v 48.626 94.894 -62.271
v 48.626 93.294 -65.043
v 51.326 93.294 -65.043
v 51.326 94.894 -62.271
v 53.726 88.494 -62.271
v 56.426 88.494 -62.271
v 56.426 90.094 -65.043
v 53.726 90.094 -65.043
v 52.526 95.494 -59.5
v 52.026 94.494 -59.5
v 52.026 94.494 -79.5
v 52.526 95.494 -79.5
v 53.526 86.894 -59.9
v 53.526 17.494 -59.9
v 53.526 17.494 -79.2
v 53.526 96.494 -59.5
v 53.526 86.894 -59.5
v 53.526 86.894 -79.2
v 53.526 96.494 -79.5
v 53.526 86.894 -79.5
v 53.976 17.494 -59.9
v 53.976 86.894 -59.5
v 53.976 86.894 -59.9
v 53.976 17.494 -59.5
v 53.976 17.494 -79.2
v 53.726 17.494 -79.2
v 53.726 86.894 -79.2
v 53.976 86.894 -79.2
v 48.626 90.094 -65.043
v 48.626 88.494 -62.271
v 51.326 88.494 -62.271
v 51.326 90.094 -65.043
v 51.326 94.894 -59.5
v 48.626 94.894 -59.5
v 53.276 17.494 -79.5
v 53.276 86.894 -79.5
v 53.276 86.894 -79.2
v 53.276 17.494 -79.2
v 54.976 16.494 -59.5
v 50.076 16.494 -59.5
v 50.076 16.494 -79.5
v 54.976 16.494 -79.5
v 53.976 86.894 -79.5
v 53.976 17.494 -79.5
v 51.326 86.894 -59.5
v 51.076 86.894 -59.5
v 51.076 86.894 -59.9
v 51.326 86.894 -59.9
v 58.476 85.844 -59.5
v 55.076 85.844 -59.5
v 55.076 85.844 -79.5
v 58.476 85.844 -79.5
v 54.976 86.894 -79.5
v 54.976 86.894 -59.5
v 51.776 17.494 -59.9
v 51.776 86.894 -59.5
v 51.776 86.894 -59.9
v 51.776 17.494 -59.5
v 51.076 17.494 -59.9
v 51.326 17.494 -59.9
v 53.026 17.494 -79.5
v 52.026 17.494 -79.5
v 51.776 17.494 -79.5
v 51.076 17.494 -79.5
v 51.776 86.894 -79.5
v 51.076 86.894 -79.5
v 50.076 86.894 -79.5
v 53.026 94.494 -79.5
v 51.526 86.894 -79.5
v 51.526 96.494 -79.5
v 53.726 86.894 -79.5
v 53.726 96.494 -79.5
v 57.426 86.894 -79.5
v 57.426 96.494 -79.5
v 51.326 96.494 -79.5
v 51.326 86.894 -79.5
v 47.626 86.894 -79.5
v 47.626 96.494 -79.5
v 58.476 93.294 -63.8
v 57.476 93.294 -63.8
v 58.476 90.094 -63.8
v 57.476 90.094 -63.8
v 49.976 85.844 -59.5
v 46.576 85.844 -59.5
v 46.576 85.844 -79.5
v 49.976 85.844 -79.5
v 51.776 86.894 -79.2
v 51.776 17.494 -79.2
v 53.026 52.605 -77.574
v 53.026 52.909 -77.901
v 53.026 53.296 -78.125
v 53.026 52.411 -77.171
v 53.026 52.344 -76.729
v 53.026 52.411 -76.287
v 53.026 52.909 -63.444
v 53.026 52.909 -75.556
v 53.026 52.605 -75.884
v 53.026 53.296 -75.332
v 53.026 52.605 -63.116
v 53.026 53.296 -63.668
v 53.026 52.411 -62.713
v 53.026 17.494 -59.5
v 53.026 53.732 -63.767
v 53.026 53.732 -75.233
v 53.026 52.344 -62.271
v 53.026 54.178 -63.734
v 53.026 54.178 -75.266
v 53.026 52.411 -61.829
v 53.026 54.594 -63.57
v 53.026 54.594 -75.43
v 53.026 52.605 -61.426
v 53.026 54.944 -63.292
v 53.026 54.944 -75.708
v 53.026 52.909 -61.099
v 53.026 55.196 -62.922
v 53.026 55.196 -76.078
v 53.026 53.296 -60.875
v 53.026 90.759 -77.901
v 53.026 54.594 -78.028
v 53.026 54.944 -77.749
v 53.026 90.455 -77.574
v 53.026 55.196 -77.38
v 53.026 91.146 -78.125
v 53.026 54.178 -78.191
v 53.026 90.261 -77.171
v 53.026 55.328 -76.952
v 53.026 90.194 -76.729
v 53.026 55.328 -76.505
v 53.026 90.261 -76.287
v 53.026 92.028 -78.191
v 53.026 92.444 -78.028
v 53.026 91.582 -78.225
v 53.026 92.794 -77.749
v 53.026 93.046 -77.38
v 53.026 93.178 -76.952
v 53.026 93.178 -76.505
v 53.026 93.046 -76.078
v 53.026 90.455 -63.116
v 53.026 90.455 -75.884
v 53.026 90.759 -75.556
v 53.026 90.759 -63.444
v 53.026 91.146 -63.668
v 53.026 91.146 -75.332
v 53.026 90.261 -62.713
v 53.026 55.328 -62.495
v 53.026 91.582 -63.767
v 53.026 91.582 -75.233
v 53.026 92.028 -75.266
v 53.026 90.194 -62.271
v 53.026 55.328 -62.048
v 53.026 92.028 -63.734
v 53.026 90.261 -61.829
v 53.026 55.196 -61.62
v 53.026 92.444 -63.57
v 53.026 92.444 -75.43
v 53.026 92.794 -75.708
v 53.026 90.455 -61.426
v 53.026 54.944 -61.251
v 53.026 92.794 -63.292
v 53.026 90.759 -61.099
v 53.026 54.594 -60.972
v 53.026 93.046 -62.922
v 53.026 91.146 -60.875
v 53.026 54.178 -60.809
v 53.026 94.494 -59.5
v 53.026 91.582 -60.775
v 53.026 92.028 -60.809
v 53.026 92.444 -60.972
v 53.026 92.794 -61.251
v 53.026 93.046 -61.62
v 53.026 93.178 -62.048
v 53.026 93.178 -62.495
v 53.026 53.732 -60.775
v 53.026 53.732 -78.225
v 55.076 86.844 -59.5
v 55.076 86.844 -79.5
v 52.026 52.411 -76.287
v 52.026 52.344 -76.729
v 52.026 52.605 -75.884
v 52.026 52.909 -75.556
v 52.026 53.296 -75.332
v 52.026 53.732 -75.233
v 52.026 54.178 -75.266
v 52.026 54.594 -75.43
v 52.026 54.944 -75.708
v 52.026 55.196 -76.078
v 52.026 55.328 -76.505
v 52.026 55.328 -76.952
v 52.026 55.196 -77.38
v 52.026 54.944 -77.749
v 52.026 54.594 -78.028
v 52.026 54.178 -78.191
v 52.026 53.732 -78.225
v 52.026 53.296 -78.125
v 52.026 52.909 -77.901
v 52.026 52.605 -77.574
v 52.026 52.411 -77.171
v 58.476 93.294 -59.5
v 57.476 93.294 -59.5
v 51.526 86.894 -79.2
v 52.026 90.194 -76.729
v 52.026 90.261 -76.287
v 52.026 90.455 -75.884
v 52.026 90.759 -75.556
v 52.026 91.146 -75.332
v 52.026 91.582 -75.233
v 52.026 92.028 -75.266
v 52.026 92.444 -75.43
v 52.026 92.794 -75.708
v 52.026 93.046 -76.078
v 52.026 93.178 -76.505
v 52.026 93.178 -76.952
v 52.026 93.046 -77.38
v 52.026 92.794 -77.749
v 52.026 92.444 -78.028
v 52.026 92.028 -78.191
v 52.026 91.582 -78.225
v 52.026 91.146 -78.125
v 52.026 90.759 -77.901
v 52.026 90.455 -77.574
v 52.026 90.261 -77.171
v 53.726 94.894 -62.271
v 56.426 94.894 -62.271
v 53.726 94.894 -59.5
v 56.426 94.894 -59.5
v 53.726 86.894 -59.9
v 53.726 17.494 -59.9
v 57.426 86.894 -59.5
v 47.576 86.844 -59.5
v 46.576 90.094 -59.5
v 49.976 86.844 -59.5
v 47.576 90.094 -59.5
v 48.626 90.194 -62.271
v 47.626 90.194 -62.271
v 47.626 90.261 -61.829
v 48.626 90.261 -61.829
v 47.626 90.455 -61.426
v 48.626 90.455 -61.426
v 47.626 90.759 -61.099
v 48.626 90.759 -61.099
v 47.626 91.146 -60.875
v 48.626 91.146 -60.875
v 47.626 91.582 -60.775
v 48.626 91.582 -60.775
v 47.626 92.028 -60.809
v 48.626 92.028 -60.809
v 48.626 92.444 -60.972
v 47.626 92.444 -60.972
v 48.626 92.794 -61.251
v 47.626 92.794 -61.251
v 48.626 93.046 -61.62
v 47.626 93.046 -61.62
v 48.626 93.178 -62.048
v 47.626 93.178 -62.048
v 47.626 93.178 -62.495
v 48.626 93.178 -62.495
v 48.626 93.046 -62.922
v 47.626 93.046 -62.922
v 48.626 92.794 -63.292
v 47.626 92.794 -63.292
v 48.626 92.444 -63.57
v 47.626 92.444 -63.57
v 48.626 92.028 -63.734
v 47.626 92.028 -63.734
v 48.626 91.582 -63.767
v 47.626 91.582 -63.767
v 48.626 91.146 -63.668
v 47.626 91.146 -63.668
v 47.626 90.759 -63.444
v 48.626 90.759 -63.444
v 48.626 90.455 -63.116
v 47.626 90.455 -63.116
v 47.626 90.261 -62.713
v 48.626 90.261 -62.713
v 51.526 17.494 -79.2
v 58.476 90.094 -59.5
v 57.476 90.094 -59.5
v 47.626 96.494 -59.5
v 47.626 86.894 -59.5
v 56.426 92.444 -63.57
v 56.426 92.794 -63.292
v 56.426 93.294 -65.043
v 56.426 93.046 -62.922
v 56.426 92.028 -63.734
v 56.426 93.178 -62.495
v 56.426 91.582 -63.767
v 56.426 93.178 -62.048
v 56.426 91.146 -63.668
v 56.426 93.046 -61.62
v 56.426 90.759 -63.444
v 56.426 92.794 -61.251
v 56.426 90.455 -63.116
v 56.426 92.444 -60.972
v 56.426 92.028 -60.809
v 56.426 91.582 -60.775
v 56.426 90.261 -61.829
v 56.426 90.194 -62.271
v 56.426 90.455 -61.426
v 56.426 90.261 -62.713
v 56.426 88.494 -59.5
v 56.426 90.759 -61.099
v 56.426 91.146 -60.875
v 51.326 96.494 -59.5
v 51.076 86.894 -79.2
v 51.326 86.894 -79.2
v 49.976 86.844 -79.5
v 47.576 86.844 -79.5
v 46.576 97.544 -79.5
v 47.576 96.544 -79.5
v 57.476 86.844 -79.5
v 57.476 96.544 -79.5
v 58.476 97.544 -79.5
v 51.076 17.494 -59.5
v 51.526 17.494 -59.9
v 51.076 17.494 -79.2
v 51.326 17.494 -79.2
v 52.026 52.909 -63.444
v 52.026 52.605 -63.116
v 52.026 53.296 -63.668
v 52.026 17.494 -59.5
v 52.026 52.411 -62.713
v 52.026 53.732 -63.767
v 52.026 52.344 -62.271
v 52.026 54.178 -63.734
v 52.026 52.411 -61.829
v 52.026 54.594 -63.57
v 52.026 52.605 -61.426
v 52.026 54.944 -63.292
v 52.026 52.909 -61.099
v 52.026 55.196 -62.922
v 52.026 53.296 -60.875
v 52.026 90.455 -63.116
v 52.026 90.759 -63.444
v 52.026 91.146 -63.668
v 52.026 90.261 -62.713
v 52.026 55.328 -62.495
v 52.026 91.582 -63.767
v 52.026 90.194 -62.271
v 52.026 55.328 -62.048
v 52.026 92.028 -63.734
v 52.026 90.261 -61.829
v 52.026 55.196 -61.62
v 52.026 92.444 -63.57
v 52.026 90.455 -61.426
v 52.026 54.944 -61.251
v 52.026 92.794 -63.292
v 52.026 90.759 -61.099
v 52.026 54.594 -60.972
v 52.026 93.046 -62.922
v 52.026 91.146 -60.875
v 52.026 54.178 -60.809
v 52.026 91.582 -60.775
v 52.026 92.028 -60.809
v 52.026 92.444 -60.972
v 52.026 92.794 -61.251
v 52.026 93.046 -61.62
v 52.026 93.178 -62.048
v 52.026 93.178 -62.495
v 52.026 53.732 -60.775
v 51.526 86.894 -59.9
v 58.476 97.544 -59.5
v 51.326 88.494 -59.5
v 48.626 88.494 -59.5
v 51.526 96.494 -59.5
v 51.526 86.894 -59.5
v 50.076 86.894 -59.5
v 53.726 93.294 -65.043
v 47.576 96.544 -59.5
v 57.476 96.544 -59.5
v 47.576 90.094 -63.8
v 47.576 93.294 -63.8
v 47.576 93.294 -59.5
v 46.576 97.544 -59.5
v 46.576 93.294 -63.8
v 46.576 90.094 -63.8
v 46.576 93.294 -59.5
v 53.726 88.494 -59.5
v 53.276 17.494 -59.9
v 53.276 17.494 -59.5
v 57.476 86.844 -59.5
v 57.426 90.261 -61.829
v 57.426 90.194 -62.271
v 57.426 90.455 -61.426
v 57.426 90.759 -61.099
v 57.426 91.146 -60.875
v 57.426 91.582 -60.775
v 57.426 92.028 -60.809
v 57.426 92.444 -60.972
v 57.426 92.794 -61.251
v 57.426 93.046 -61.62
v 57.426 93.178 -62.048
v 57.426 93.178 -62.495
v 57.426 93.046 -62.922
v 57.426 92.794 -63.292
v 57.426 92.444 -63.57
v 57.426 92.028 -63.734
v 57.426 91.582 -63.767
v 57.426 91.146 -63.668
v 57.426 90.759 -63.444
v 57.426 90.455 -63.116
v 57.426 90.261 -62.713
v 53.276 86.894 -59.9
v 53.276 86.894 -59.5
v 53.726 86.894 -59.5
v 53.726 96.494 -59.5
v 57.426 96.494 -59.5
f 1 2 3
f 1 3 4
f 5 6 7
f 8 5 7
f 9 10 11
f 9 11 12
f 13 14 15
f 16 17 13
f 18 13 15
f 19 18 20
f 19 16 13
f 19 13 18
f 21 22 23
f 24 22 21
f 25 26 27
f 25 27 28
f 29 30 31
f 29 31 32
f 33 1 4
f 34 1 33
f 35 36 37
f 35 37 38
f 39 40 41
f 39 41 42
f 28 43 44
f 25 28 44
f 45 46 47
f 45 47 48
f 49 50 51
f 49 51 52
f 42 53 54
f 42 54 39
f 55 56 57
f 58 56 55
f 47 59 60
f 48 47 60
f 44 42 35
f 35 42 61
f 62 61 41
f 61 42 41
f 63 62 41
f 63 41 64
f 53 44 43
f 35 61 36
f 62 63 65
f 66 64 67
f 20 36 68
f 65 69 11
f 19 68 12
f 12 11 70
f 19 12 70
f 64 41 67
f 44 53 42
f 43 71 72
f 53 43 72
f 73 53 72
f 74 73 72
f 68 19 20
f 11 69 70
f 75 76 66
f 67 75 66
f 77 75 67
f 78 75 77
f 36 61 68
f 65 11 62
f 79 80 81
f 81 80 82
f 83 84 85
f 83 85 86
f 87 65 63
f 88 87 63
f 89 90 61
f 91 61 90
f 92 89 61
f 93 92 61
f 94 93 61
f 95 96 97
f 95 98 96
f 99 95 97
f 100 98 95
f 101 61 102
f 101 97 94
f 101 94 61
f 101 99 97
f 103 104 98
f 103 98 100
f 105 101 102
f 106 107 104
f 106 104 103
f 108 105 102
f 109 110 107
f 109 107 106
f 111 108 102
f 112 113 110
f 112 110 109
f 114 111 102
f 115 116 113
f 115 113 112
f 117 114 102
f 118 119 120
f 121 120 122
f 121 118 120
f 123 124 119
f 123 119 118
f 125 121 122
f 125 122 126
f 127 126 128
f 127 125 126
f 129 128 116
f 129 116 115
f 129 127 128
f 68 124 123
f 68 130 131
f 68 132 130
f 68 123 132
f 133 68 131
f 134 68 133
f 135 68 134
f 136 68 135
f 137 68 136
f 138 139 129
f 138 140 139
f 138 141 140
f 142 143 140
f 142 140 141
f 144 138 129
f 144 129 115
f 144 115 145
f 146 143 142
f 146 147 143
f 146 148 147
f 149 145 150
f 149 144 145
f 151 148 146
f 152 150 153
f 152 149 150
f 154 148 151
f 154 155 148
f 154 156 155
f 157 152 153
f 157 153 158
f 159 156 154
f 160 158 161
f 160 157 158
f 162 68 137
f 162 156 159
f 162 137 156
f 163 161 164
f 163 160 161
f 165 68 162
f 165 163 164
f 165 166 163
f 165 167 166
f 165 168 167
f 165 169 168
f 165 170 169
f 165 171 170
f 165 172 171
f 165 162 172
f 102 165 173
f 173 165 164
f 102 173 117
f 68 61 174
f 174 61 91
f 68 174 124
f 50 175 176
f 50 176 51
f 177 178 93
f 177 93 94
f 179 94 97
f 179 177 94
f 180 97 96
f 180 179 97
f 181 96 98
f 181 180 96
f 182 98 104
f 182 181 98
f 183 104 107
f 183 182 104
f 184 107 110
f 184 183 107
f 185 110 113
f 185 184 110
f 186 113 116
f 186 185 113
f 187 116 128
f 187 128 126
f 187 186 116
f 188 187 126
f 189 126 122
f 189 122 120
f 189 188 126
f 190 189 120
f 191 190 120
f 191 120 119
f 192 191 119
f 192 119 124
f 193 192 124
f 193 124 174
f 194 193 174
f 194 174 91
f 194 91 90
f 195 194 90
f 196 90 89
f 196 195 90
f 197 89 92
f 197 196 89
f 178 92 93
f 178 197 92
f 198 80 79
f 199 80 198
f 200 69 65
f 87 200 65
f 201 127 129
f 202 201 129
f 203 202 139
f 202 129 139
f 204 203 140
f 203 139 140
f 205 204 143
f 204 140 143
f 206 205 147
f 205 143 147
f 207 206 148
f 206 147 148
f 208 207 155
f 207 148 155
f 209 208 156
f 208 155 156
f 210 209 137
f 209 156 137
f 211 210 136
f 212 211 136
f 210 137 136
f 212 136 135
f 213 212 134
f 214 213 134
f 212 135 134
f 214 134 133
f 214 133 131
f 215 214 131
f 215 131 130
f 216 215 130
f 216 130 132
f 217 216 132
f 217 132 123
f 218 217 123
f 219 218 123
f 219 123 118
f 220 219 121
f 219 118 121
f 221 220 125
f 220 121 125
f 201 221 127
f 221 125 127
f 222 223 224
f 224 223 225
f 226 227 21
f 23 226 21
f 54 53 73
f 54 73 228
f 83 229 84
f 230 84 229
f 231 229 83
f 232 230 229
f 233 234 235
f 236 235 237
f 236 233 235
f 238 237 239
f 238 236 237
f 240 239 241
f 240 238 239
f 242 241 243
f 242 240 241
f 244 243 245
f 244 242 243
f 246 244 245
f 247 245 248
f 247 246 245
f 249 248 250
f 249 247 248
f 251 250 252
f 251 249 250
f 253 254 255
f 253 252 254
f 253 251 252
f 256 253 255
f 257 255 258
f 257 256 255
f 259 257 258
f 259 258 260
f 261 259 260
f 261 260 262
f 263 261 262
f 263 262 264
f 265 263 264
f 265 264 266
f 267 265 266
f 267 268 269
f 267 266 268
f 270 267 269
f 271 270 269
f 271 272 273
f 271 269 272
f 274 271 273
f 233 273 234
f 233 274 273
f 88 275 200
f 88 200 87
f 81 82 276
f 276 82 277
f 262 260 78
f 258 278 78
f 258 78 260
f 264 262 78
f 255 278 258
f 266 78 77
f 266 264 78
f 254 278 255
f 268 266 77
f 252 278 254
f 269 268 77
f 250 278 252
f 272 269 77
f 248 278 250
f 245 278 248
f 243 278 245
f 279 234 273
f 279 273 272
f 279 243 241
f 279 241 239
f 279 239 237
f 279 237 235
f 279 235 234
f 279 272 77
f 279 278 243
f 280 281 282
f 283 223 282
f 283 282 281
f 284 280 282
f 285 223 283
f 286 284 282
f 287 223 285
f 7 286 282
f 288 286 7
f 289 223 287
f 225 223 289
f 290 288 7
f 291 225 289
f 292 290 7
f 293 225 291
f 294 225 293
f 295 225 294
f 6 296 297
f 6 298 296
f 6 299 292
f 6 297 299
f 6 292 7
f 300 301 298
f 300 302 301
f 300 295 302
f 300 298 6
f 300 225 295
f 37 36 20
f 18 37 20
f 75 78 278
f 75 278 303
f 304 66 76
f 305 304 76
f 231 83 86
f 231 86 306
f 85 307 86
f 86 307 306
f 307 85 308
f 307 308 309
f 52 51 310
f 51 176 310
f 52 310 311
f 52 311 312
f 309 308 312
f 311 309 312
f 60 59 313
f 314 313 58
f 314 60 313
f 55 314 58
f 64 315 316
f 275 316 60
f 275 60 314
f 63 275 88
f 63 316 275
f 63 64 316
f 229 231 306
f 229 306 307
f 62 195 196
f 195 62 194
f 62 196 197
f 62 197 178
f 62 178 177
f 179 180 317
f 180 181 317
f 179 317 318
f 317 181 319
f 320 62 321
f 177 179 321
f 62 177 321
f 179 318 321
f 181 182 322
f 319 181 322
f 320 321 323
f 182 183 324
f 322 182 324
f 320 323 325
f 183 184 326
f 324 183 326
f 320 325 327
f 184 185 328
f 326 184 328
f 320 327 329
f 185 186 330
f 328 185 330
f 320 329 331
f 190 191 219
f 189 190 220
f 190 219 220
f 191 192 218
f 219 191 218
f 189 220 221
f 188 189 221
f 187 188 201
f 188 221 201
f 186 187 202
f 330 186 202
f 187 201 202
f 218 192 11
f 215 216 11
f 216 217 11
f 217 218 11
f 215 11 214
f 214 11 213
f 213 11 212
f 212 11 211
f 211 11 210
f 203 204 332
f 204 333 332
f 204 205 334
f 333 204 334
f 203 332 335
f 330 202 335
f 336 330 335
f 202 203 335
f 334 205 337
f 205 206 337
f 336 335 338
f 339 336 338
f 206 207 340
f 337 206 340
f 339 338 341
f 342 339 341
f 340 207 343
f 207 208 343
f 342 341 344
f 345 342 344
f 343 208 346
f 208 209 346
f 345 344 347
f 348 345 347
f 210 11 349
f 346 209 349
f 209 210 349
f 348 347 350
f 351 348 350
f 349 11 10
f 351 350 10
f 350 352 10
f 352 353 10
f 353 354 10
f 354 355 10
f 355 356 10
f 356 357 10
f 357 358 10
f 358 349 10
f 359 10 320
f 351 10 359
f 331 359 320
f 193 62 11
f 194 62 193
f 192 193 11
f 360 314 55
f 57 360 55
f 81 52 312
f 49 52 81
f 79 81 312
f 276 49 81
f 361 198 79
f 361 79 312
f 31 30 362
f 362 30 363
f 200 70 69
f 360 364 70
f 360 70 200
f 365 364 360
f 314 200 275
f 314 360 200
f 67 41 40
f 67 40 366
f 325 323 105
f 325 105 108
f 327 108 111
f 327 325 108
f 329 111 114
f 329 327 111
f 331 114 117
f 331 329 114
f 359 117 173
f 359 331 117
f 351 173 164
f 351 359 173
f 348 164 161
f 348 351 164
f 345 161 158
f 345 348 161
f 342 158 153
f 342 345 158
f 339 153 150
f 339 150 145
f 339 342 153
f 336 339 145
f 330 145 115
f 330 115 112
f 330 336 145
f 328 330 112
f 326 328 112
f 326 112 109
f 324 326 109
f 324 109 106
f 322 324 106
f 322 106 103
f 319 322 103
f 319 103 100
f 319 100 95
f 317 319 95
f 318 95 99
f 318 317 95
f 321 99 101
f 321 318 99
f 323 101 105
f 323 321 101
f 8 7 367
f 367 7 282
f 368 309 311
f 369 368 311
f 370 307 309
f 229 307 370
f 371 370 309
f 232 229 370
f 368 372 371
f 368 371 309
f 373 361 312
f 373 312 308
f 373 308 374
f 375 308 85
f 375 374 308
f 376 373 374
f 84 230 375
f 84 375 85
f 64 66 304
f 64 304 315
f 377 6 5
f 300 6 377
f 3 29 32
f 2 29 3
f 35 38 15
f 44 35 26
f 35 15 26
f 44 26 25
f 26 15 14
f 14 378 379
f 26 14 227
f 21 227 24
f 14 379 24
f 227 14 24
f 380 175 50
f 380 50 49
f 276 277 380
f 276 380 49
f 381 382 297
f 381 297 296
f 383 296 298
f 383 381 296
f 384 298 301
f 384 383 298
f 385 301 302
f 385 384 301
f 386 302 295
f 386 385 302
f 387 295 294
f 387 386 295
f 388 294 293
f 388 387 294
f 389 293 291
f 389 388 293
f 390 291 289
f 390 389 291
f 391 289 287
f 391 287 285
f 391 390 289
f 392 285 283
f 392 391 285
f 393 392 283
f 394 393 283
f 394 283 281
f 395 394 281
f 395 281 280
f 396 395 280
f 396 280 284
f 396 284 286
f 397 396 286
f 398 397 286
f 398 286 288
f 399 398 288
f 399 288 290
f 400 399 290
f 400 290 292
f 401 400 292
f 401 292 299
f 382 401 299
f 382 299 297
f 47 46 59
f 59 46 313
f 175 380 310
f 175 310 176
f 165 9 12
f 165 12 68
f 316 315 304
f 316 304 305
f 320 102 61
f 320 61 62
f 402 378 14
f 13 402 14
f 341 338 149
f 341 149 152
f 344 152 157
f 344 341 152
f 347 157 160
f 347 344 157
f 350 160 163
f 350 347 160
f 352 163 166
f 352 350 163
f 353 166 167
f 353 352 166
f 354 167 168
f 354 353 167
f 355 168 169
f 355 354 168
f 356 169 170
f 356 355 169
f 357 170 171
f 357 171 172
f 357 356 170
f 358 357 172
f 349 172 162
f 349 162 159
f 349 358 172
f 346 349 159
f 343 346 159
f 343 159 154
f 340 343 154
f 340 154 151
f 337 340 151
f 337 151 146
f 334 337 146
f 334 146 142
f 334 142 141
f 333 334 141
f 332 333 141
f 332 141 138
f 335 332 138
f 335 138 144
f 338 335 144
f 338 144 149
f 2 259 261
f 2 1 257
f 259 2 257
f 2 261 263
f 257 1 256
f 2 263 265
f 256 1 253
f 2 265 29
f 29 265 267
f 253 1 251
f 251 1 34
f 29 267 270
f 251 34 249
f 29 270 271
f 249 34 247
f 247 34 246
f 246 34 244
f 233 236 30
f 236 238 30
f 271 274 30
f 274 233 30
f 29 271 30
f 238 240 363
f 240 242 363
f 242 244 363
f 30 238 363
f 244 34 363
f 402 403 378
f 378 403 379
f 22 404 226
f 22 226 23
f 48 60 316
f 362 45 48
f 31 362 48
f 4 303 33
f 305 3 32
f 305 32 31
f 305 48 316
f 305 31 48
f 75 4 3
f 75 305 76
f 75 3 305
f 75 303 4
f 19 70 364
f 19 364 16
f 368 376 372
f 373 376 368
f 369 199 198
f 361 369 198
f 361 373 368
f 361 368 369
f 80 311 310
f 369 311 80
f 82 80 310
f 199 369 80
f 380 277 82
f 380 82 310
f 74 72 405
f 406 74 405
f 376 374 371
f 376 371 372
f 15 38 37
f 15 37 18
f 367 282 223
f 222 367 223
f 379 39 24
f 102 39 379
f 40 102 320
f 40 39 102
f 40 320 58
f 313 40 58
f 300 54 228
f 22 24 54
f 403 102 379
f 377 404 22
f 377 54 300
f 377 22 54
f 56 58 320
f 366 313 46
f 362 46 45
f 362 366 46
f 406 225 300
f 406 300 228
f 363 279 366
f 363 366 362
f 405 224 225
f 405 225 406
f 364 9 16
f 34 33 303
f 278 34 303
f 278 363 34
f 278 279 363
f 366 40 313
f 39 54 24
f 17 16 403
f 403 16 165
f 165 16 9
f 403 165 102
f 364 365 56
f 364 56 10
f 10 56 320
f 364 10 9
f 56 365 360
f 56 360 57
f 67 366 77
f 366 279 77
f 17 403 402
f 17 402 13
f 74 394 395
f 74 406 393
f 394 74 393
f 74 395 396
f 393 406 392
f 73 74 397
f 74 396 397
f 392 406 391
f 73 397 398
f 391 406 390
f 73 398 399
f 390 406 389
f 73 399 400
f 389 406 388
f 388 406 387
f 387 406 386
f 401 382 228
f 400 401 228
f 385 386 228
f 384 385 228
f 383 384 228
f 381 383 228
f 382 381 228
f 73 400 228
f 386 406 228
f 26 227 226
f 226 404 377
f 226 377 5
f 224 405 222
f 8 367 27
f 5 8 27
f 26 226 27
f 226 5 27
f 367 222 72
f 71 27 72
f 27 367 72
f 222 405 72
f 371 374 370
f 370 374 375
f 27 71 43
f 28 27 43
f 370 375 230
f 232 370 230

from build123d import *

# Parameters (mm, degrees)
RECTANGLE019_W         = 3.2
RECTANGLE019_H         = 4.3
EXTRUSION029_DEPTH     = 17.8604402213
EXTRUSION028_DEPTH     = 20
FACE001_W              = 70.4
FACE001_H              = 20
EXTRUSION027_DEPTH     = 1.2
FACE_W                 = 70.4
FACE_H                 = 20
EXTRUSION026_DEPTH     = 1.2
CLONE2D008_W           = 0.7
CLONE2D008_H           = 69.4
EXTRUSION025_DEPTH     = 0.4
RECTANGLE018_W         = 0.7
RECTANGLE018_H         = 69.4
EXTRUSION024_DEPTH     = 0.4
RECTANGLE017_W         = 0.7
RECTANGLE017_H         = 69.4
EXTRUSION023_DEPTH     = 0.3
RECTANGLE016_W         = 0.7
RECTANGLE016_H         = 69.4
EXTRUSION022_DEPTH     = 0.3
CLONE2D004_R           = 1.5
EXTRUSION_DEPTH        = 1
CIRCLE001_R            = 1.5
EXTRUSION020_DEPTH     = 1.5
CIRCLE_R               = 1.5
EXTRUSION019_DEPTH     = 18.8711460539
RECTANGLE014_W         = 9.6
RECTANGLE014_H         = 20
EXTRUSION017_DEPTH     = 1
RECTANGLE013_W         = 6.4
RECTANGLE013_H         = 2.7712812921
EXTRUSION016_DEPTH     = 2.7
RECTANGLE012_W         = 6.4
RECTANGLE012_H         = 2.7712812921
EXTRUSION015_DEPTH     = 2.7
EXTRUSION014_DEPTH     = 2.7
EXTRUSION013_DEPTH     = 2.7
RECTANGLE011_W         = 9.6
RECTANGLE011_H         = 20
EXTRUSION011_DEPTH     = 0.25
RECTANGLE010_W         = 9.44665831
RECTANGLE010_H         = 103.1218659611
EXTRUSION010_DEPTH     = 80.6022812444
RECTANGLE009_W         = 15.0148324292
RECTANGLE009_H         = 103.2643527035
EXTRUSION009_DEPTH     = 80.6022812444
RECTANGLE008_W         = 7.8
RECTANGLE008_H         = 20
EXTRUSION008_DEPTH     = 104.8179216702
RECTANGLE005_W         = 1
RECTANGLE005_H         = 200.9596025133
EXTRUSION005_DEPTH     = 79
RECTANGLE004_W         = 0.2
RECTANGLE004_H         = 30
EXTRUSION003_DEPTH     = 79
CLONE2D_W              = 0.2
CLONE2D_H              = 30
EXTRUSION004_DEPTH     = 79
RECTANGLE002_W         = 20
RECTANGLE002_H         = 20
EXTRUSION002_DEPTH     = 80
EXTRUSION006_DEPTH     = 55.9863181429
RECTANGLE006_W         = 20
RECTANGLE006_H         = 1
EXTRUSION007_DEPTH     = 2
CUT005_PLACEMENT_ANGLE = 270
CLONE2D002_W           = 9.6
CLONE2D002_H           = 20
EXTRUSION012_DEPTH     = 0.25
RECTANGLE015_W         = 9.6
RECTANGLE015_H         = 20
EXTRUSION018_DEPTH     = 1
CIRCLE002_R            = 1.5
EXTRUSION021_DEPTH     = 1
CIRCLE003_R            = 1.5
EXTRUSION030_DEPTH     = 1


with BuildPart() as extrusion030:
    # Rectangle019 → Extrusion029 (new body)
    with BuildSketch(Plane(origin=(46.5756657044, 93.2944395523, -63.8), x_dir=(0, -1, 0), z_dir=(-1, 0, 0))):
        with Locations((1.6, 2.15)):
            Rectangle(RECTANGLE019_W, RECTANGLE019_H)
    extrude(amount=-EXTRUSION029_DEPTH)


with BuildPart() as cut018002:
    # Wire001 → Extrusion028 (new body)
    with BuildSketch(Plane(origin=(55.0756657044, 85.8444395523, -59.5), x_dir=(1, 0, 0), z_dir=(0, 0, 1))):
        Polygon((0, 0), (3.4, 0), (3.4, 11.7), (-8.5, 11.7), (-8.5, 0), (-5.1, 0), (-5.1, 1), (-7.5, 1), (-7.5, 10.7), (2.4, 10.7), (2.4, 1), (0, 1), align=None)
    extrude(amount=-EXTRUSION028_DEPTH)

    # Cut018002: cut Extrusion030
    add(extrusion030.part, mode=Mode.SUBTRACT)


with BuildPart() as extrusion028:
    # Face001 → Extrusion027 (new body)
    with BuildSketch(Plane(origin=(56.1756657044, 51.6944395523, -69.5), x_dir=(0, -1, 0), z_dir=(1, 0, 0))):
        Rectangle(FACE001_W, FACE001_H)
    extrude(amount=-EXTRUSION027_DEPTH)


with BuildPart() as extrusion027:
    # Face → Extrusion026 (new body)
    with BuildSketch(Plane(origin=(48.8756657044, 51.6944395523, -69.5), x_dir=(0, 1, 0), z_dir=(-1, 0, 0))):
        Rectangle(FACE_W, FACE_H)
    extrude(amount=-EXTRUSION026_DEPTH)


with BuildPart() as extrusion026:
    # Clone2D008 → Extrusion025 (new body)
    with BuildSketch(Plane(origin=(51.0756657044, 86.8944395523, -59.5), x_dir=(1, 0, 0), z_dir=(0, 0, -1))):
        with Locations((0.35, 34.7)):
            Rectangle(CLONE2D008_W, CLONE2D008_H)
    extrude(amount=EXTRUSION025_DEPTH)


with BuildPart() as extrusion025:
    # Rectangle018 → Extrusion024 (new body)
    with BuildSketch(Plane(origin=(53.2756657044, 86.8944395523, -59.5), x_dir=(1, 0, 0), z_dir=(0, 0, -1))):
        with Locations((0.35, 34.7)):
            Rectangle(RECTANGLE018_W, RECTANGLE018_H)
    extrude(amount=EXTRUSION024_DEPTH)


with BuildPart() as extrusion024:
    # Rectangle017 → Extrusion023 (new body)
    with BuildSketch(Plane(origin=(51.0756657044, 86.8944395523, -79.5), x_dir=(1, 0, 0), z_dir=(0, 0, -1))):
        with Locations((0.35, 34.7)):
            Rectangle(RECTANGLE017_W, RECTANGLE017_H)
    extrude(amount=-EXTRUSION023_DEPTH)


with BuildPart() as extrusion023:
    # Rectangle016 → Extrusion022 (new body)
    with BuildSketch(Plane(origin=(53.2756657044, 86.8944395523, -79.5), x_dir=(1, 0, 0), z_dir=(0, 0, -1))):
        with Locations((0.35, 34.7)):
            Rectangle(RECTANGLE016_W, RECTANGLE016_H)
    extrude(amount=-EXTRUSION022_DEPTH)


with BuildPart() as extrusion:
    # Clone2D004 → Extrusion (new body)
    with BuildSketch(Plane(origin=(52.0256657044, 53.8444395523, -76.7287187079), x_dir=(0, -1, 0), z_dir=(-1, 0, 0))):
        Circle(CLONE2D004_R)
    extrude(amount=-EXTRUSION_DEPTH)


with BuildPart() as extrusion021:
    # Circle001 → Extrusion020 (new body)
    with BuildSketch(Plane(origin=(51.5256657044, 91.6944395523, -62.2712812921), x_dir=(0, -1, 0), z_dir=(-1, 0, 0))):
        Circle(CIRCLE001_R)
    extrude(amount=-EXTRUSION020_DEPTH)


with BuildPart() as extrusion019:
    # Circle → Extrusion019 (new body)
    with BuildSketch(Plane(origin=(48.6256657044, 91.6944395523, -62.2712812921), x_dir=(0, -1, 0), z_dir=(-1, 0, 0))):
        Circle(CIRCLE_R)
    extrude(amount=EXTRUSION019_DEPTH)


with BuildPart() as cut013:
    # Rectangle014 → Extrusion017 (new body)
    with BuildSketch(Plane(origin=(48.6256657044, 96.4944395523, -79.5), x_dir=(0, -1, 0), z_dir=(-1, 0, 0))):
        with Locations((4.8, 10)):
            Rectangle(RECTANGLE014_W, RECTANGLE014_H)
    extrude(amount=EXTRUSION017_DEPTH)

    # Cut013: cut Extrusion019
    add(extrusion019.part, mode=Mode.SUBTRACT)


with BuildPart() as extrusion016:
    # Rectangle013 → Extrusion016 (new body)
    with BuildSketch(Plane(origin=(56.4256657044, 88.4944395523, -62.2712812921), x_dir=(0, 1, 0), z_dir=(1, 0, 0))):
        with Locations((3.2, 1.3856406461)):
            Rectangle(RECTANGLE013_W, RECTANGLE013_H)
    extrude(amount=-EXTRUSION016_DEPTH)


with BuildPart() as extrusion015:
    # Rectangle012 → Extrusion015 (new body)
    with BuildSketch(Plane(origin=(48.6256657044, 94.8944395523, -62.2712812921), x_dir=(0, -1, 0), z_dir=(-1, 0, 0))):
        with Locations((3.2, 1.3856406461)):
            Rectangle(RECTANGLE012_W, RECTANGLE012_H)
    extrude(amount=-EXTRUSION015_DEPTH)


with BuildPart() as extrusion014:
    # Polygon → Extrusion014 (new body)
    with BuildSketch(Plane(origin=(48.6256657044, 91.6944395523, -62.2712812921), x_dir=(0, 1, 0), z_dir=(1, 0, 0))):
        Polygon((3.2, 0), (1.6, 2.7712812921), (-1.6, 2.7712812921), (-3.2, 0), (-1.6, -2.7712812921), (1.6, -2.7712812921), align=None)
    extrude(amount=EXTRUSION014_DEPTH)


with BuildPart() as extrusion013:
    # Clone2D001 → Extrusion013 (new body)
    with BuildSketch(Plane(origin=(56.4256657044, 91.6944395523, -62.2712812921), x_dir=(0, 1, 0), z_dir=(1, 0, 0))):
        Polygon((3.2, 0), (1.6, 2.7712812921), (-1.6, 2.7712812921), (-3.2, 0), (-1.6, -2.7712812921), (1.6, -2.7712812921), align=None)
    extrude(amount=-EXTRUSION013_DEPTH)


with BuildPart() as extrusion011:
    # Rectangle011 → Extrusion011 (new body)
    with BuildSketch(Plane(origin=(56.1756657044, 86.8944395523, -79.5), x_dir=(0, 1, 0), z_dir=(1, 0, 0))):
        with Locations((4.8, 10)):
            Rectangle(RECTANGLE011_W, RECTANGLE011_H)
    extrude(amount=EXTRUSION011_DEPTH)


with BuildPart() as extrusion010:
    # Rectangle010 → Extrusion010 (new body)
    with BuildSketch(Plane(origin=(56.1756657044, -6.6274264088, -59.5), x_dir=(1, 0, 0), z_dir=(0, 0, 1))):
        with Locations((4.723329155, 51.5609329805)):
            Rectangle(RECTANGLE010_W, RECTANGLE010_H)
    extrude(amount=-EXTRUSION010_DEPTH)


with BuildPart() as extrusion009:
    # Rectangle009 → Extrusion009 (new body)
    with BuildSketch(Plane(origin=(33.8608332752, -6.7699131513, -59.5), x_dir=(1, 0, 0), z_dir=(0, 0, 1))):
        with Locations((7.5074162146, 51.6321763518)):
            Rectangle(RECTANGLE009_W, RECTANGLE009_H)
    extrude(amount=-EXTRUSION009_DEPTH)


with BuildPart() as extrusion008:
    # Rectangle008 → Extrusion008 (new body)
    with BuildSketch(Plane(origin=(66.4256657044, 16.4944395523, 0.5), x_dir=(-1, 0, 0), z_dir=(0, 0, 1))):
        with Locations((3.9, 10)):
            Rectangle(RECTANGLE008_W, RECTANGLE008_H)
    extrude(amount=-EXTRUSION008_DEPTH)


with BuildPart() as extrusion005:
    # Rectangle005 → Extrusion005 (new body)
    with BuildSketch(Plane(origin=(53.0256657044, 101.9742408089, 0.5), x_dir=(-1, 0, 0), z_dir=(0, 0, 1))):
        with Locations((0.5, 100.4798012566)):
            Rectangle(RECTANGLE005_W, RECTANGLE005_H)
    extrude(amount=-EXTRUSION005_DEPTH)


with BuildPart() as extrusion003:
    # Rectangle004 → Extrusion003 (new body)
    with BuildSketch(Plane(origin=(51.3256657044, -13.5055604477, 0.5), x_dir=(1, 0, 0), z_dir=(0, 0, 1))):
        with Locations((0.1, 15)):
            Rectangle(RECTANGLE004_W, RECTANGLE004_H)
    extrude(amount=-EXTRUSION003_DEPTH)


with BuildPart() as extrusion004:
    # Clone2D → Extrusion004 (new body)
    with BuildSketch(Plane(origin=(53.5256657044, -13.5055604477, 0.5), x_dir=(1, 0, 0), z_dir=(0, 0, 1))):
        with Locations((0.1, 15)):
            Rectangle(CLONE2D_W, CLONE2D_H)
    extrude(amount=-EXTRUSION004_DEPTH)


with BuildPart() as cut003:
    # Rectangle002 → Extrusion002 (new body)
    with BuildSketch(Plane(origin=(46.4256657044, -3.5055604477, 0.5), x_dir=(1, 0, 0), z_dir=(0, 0, 1))):
        with Locations((10, 10)):
            Rectangle(RECTANGLE002_W, RECTANGLE002_H)
    extrude(amount=-EXTRUSION002_DEPTH)

    # Cut001: cut Extrusion004
    add(extrusion004.part, mode=Mode.SUBTRACT)

    # Cut002: cut Extrusion003
    add(extrusion003.part, mode=Mode.SUBTRACT)

    # Cut003: cut Extrusion005
    add(extrusion005.part, mode=Mode.SUBTRACT)


with BuildPart() as extrusion006:
    # Wire → Extrusion006 (new body)
    with BuildSketch(Plane(origin=(52.0256657044, -3.5055604477, -1.5), x_dir=(1, 0, 0), z_dir=(0, -1, 0))):
        Polygon((0, 0), (0.5, 1), (1, 0), align=None)
    extrude(amount=-EXTRUSION006_DEPTH)


with BuildPart() as fusion001:
    # Rectangle006 → Extrusion007 (new body)
    with BuildSketch(Plane(origin=(53.0256657044, -3.5055604477, 0.5), x_dir=(0, 1, 0), z_dir=(0, 0, 1))):
        with Locations((10, 0.5)):
            Rectangle(RECTANGLE006_W, RECTANGLE006_H)
    extrude(amount=-EXTRUSION007_DEPTH)

    # Cut004: cut Extrusion006
    add(extrusion006.part, mode=Mode.SUBTRACT)

    # Fusion: union Cut003
    add(cut003.part)

    # Cut005: cut Extrusion008
    add(extrusion008.part, mode=Mode.SUBTRACT)


with BuildPart() as fusion001_1:
    # Cut005 placement: moved
    add(fusion001.part.moved(Location((0, 95.9944395523, -63.0055604477))).rotate(Axis((0, 95.9944395523, -63.0055604477), (1, 0, 0)), CUT005_PLACEMENT_ANGLE))

    # Cut006: cut Extrusion009
    add(extrusion009.part, mode=Mode.SUBTRACT)

    # Cut007: cut Extrusion010
    add(extrusion010.part, mode=Mode.SUBTRACT)

    # Fusion001: union Extrusion011
    add(extrusion011.part)


with BuildPart() as cut011:
    # Clone2D002 → Extrusion012 (new body)
    with BuildSketch(Plane(origin=(48.8756657044, 86.8944395523, -79.5), x_dir=(0, 1, 0), z_dir=(1, 0, 0))):
        with Locations((4.8, 10)):
            Rectangle(CLONE2D002_W, CLONE2D002_H)
    extrude(amount=-EXTRUSION012_DEPTH)

    # Fusion002: union Fusion001
    add(fusion001_1.part)

    # Cut008: cut Extrusion013
    add(extrusion013.part, mode=Mode.SUBTRACT)

    # Cut009: cut Extrusion014
    add(extrusion014.part, mode=Mode.SUBTRACT)

    # Cut010: cut Extrusion015
    add(extrusion015.part, mode=Mode.SUBTRACT)

    # Cut011: cut Extrusion016
    add(extrusion016.part, mode=Mode.SUBTRACT)


with BuildPart() as extrusion020:
    # Clone base: copy of Extrusion019
    add(extrusion019.part)


with BuildPart() as extrusion020_1:
    # Clone placement: moved
    add(extrusion020.part.moved(Location((26.6711460539, 0, 0))))


with BuildPart() as fusion003002:
    # Rectangle015 → Extrusion018 (new body)
    with BuildSketch(Plane(origin=(56.4256657044, 96.4944395523, -79.5), x_dir=(0, -1, 0), z_dir=(-1, 0, 0))):
        with Locations((4.8, 10)):
            Rectangle(RECTANGLE015_W, RECTANGLE015_H)
    extrude(amount=-EXTRUSION018_DEPTH)

    # Cut012: cut Extrusion020
    add(extrusion020_1.part, mode=Mode.SUBTRACT)

    # Fusion003: union Cut013, Cut011
    add(cut013.part)
    add(cut011.part)

    # Fusion003002: union Extrusion021
    add(extrusion021.part)


with BuildPart() as cut018001:
    # Circle002 → Extrusion021 (new body)
    with BuildSketch(Plane(origin=(52.0256657044, 53.8444395523, -62.2712812921), x_dir=(0, -1, 0), z_dir=(-1, 0, 0))):
        Circle(CIRCLE002_R)
    extrude(amount=-EXTRUSION021_DEPTH)

    # Fusion003003: union Extrusion, Fusion003002
    add(extrusion.part)
    add(fusion003002.part)

    # Cut: cut Extrusion023
    add(extrusion023.part, mode=Mode.SUBTRACT)

    # Cut014: cut Extrusion024
    add(extrusion024.part, mode=Mode.SUBTRACT)

    # Cut015: cut Extrusion025
    add(extrusion025.part, mode=Mode.SUBTRACT)

    # Cut016: cut Extrusion026
    add(extrusion026.part, mode=Mode.SUBTRACT)

    # Cut017: cut Extrusion027
    add(extrusion027.part, mode=Mode.SUBTRACT)

    # Cut018: cut Extrusion028
    add(extrusion028.part, mode=Mode.SUBTRACT)


with BuildPart() as fusion003004:
    # Circle003 → Extrusion030 (new body)
    with BuildSketch(Plane(origin=(53.0256657044, 91.6944395523, -76.7287187079), x_dir=(0, -1, 0), z_dir=(-1, 0, 0))):
        Circle(CIRCLE003_R)
    extrude(amount=EXTRUSION030_DEPTH)

    # Fusion003004: union Cut018001
    add(cut018001.part)


solid = Compound([cut018002.part, fusion003004.part])
